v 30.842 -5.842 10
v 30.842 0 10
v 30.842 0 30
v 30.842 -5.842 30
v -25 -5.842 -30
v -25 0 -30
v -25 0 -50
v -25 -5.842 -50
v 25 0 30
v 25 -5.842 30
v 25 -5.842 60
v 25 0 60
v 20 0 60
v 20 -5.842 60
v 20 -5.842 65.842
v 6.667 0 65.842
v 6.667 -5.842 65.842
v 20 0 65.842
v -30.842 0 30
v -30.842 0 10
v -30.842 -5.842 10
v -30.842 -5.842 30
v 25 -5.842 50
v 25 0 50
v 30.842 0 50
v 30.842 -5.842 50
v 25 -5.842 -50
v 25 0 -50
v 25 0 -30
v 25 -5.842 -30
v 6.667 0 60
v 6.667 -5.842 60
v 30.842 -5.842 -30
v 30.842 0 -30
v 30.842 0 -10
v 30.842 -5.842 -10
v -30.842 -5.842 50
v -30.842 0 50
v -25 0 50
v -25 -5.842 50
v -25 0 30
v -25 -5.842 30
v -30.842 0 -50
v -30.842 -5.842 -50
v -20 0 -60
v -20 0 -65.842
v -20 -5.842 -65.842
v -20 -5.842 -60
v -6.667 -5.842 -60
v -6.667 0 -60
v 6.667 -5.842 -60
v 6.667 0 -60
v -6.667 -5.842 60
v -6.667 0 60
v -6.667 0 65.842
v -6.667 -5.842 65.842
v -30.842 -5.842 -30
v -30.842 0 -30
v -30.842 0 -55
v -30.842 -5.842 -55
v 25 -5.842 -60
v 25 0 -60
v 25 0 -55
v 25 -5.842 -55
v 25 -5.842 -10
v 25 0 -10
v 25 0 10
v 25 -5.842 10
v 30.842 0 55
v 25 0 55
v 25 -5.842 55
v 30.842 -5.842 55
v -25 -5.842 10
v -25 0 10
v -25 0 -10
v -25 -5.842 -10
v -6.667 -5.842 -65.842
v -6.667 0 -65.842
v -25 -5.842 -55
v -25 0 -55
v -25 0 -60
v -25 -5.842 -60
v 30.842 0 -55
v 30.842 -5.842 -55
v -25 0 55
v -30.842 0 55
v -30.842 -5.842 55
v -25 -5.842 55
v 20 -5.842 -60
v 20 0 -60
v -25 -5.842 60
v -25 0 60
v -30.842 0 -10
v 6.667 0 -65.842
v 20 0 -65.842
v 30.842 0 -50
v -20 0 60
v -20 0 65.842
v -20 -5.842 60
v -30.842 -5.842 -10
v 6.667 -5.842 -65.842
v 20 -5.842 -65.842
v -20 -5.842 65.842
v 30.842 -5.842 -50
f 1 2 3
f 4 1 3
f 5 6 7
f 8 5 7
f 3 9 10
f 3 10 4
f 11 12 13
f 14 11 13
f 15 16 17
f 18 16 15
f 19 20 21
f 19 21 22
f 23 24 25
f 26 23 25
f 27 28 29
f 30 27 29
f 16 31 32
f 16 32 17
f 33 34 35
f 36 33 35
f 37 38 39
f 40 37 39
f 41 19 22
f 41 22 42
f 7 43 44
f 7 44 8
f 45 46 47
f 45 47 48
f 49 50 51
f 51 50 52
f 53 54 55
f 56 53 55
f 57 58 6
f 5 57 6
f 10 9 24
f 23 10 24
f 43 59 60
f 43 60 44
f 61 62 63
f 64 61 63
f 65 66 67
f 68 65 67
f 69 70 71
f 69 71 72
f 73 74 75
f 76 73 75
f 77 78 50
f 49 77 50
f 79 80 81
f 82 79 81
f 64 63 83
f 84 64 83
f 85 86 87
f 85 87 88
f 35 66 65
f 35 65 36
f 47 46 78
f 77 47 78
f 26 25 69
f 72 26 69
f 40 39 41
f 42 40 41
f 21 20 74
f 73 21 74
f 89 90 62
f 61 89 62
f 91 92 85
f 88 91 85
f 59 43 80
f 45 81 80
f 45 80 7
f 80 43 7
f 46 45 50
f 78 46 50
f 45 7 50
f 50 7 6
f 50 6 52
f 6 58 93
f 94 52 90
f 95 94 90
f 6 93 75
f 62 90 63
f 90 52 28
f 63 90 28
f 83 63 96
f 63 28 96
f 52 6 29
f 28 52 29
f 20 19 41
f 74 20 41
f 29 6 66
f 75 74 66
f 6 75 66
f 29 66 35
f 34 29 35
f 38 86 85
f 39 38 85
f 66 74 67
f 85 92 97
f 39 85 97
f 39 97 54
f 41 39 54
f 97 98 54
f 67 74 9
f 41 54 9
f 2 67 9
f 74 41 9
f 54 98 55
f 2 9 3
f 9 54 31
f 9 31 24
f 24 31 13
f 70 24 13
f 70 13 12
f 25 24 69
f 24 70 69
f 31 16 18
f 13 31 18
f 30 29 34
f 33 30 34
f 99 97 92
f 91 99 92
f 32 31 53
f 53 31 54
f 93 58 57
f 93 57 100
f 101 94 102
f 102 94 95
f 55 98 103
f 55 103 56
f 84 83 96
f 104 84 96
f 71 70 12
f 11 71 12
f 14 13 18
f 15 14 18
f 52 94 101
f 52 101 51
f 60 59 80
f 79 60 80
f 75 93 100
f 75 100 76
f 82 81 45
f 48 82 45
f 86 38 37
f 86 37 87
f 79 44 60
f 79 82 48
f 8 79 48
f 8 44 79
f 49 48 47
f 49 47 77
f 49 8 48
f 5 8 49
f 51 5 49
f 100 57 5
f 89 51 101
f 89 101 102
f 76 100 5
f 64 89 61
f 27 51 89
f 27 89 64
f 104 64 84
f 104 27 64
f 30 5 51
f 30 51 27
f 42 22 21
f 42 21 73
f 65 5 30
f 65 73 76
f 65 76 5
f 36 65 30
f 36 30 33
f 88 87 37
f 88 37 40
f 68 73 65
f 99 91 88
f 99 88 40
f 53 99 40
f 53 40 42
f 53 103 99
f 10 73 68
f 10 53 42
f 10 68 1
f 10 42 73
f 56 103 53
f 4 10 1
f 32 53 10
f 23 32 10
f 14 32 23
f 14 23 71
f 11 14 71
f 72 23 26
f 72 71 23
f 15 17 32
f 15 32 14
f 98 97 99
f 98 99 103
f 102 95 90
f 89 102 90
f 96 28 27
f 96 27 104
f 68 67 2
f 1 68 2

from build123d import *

# Parameters (mm, degrees)
F0_W     = 13.333333
F0_H     = 5.842
F0_W_2   = 5.842
F0_H_2   = 5
F0_H_3   = 20
F1_DEPTH = 5.842


with BuildPart() as f1:
    # F0 (on Front) → F1 (new body)
    with BuildSketch(Plane.XZ):
        Polygon((-20, 60), (-25, 60), (-25, 55), (-25, 50), (-25, 30), (-25, 10), (-25, -10), (-25, -30), (-25, -50), (-25, -55), (-25, -60), (-20, -60), (-6.666667, -60), (6.666667, -60), (20, -60), (25, -60), (25, -55), (25, -50), (25, -30), (25, -10), (25, 10), (25, 30), (25, 50), (25, 55), (25, 60), (20, 60), (6.666667, 60), (-6.666667, 60), align=None)
        with Locations((-13.333334, 62.921)):
            Rectangle(F0_W, F0_H)
        with Locations((-27.921, 52.5)):
            Rectangle(F0_W_2, F0_H_2)
        with Locations((13.333334, 62.921)):
            Rectangle(F0_W, F0_H)
        with Locations((-27.921, 20)):
            Rectangle(F0_W_2, F0_H_3)
        with Locations((-27.921, -20)):
            Rectangle(F0_W_2, F0_H_3)
        with Locations((27.921, 52.5)):
            Rectangle(F0_W_2, F0_H_2)
        with Locations((-27.921, -52.5)):
            Rectangle(F0_W_2, F0_H_2)
        with Locations((27.921, 20)):
            Rectangle(F0_W_2, F0_H_3)
        with Locations((27.921, -20)):
            Rectangle(F0_W_2, F0_H_3)
        with Locations((-13.333334, -62.921)):
            Rectangle(F0_W, F0_H)
        with Locations((27.921, -52.5)):
            Rectangle(F0_W_2, F0_H_2)
        with Locations((13.333334, -62.921)):
            Rectangle(F0_W, F0_H)
    extrude(amount=F1_DEPTH)


solid = f1.part
